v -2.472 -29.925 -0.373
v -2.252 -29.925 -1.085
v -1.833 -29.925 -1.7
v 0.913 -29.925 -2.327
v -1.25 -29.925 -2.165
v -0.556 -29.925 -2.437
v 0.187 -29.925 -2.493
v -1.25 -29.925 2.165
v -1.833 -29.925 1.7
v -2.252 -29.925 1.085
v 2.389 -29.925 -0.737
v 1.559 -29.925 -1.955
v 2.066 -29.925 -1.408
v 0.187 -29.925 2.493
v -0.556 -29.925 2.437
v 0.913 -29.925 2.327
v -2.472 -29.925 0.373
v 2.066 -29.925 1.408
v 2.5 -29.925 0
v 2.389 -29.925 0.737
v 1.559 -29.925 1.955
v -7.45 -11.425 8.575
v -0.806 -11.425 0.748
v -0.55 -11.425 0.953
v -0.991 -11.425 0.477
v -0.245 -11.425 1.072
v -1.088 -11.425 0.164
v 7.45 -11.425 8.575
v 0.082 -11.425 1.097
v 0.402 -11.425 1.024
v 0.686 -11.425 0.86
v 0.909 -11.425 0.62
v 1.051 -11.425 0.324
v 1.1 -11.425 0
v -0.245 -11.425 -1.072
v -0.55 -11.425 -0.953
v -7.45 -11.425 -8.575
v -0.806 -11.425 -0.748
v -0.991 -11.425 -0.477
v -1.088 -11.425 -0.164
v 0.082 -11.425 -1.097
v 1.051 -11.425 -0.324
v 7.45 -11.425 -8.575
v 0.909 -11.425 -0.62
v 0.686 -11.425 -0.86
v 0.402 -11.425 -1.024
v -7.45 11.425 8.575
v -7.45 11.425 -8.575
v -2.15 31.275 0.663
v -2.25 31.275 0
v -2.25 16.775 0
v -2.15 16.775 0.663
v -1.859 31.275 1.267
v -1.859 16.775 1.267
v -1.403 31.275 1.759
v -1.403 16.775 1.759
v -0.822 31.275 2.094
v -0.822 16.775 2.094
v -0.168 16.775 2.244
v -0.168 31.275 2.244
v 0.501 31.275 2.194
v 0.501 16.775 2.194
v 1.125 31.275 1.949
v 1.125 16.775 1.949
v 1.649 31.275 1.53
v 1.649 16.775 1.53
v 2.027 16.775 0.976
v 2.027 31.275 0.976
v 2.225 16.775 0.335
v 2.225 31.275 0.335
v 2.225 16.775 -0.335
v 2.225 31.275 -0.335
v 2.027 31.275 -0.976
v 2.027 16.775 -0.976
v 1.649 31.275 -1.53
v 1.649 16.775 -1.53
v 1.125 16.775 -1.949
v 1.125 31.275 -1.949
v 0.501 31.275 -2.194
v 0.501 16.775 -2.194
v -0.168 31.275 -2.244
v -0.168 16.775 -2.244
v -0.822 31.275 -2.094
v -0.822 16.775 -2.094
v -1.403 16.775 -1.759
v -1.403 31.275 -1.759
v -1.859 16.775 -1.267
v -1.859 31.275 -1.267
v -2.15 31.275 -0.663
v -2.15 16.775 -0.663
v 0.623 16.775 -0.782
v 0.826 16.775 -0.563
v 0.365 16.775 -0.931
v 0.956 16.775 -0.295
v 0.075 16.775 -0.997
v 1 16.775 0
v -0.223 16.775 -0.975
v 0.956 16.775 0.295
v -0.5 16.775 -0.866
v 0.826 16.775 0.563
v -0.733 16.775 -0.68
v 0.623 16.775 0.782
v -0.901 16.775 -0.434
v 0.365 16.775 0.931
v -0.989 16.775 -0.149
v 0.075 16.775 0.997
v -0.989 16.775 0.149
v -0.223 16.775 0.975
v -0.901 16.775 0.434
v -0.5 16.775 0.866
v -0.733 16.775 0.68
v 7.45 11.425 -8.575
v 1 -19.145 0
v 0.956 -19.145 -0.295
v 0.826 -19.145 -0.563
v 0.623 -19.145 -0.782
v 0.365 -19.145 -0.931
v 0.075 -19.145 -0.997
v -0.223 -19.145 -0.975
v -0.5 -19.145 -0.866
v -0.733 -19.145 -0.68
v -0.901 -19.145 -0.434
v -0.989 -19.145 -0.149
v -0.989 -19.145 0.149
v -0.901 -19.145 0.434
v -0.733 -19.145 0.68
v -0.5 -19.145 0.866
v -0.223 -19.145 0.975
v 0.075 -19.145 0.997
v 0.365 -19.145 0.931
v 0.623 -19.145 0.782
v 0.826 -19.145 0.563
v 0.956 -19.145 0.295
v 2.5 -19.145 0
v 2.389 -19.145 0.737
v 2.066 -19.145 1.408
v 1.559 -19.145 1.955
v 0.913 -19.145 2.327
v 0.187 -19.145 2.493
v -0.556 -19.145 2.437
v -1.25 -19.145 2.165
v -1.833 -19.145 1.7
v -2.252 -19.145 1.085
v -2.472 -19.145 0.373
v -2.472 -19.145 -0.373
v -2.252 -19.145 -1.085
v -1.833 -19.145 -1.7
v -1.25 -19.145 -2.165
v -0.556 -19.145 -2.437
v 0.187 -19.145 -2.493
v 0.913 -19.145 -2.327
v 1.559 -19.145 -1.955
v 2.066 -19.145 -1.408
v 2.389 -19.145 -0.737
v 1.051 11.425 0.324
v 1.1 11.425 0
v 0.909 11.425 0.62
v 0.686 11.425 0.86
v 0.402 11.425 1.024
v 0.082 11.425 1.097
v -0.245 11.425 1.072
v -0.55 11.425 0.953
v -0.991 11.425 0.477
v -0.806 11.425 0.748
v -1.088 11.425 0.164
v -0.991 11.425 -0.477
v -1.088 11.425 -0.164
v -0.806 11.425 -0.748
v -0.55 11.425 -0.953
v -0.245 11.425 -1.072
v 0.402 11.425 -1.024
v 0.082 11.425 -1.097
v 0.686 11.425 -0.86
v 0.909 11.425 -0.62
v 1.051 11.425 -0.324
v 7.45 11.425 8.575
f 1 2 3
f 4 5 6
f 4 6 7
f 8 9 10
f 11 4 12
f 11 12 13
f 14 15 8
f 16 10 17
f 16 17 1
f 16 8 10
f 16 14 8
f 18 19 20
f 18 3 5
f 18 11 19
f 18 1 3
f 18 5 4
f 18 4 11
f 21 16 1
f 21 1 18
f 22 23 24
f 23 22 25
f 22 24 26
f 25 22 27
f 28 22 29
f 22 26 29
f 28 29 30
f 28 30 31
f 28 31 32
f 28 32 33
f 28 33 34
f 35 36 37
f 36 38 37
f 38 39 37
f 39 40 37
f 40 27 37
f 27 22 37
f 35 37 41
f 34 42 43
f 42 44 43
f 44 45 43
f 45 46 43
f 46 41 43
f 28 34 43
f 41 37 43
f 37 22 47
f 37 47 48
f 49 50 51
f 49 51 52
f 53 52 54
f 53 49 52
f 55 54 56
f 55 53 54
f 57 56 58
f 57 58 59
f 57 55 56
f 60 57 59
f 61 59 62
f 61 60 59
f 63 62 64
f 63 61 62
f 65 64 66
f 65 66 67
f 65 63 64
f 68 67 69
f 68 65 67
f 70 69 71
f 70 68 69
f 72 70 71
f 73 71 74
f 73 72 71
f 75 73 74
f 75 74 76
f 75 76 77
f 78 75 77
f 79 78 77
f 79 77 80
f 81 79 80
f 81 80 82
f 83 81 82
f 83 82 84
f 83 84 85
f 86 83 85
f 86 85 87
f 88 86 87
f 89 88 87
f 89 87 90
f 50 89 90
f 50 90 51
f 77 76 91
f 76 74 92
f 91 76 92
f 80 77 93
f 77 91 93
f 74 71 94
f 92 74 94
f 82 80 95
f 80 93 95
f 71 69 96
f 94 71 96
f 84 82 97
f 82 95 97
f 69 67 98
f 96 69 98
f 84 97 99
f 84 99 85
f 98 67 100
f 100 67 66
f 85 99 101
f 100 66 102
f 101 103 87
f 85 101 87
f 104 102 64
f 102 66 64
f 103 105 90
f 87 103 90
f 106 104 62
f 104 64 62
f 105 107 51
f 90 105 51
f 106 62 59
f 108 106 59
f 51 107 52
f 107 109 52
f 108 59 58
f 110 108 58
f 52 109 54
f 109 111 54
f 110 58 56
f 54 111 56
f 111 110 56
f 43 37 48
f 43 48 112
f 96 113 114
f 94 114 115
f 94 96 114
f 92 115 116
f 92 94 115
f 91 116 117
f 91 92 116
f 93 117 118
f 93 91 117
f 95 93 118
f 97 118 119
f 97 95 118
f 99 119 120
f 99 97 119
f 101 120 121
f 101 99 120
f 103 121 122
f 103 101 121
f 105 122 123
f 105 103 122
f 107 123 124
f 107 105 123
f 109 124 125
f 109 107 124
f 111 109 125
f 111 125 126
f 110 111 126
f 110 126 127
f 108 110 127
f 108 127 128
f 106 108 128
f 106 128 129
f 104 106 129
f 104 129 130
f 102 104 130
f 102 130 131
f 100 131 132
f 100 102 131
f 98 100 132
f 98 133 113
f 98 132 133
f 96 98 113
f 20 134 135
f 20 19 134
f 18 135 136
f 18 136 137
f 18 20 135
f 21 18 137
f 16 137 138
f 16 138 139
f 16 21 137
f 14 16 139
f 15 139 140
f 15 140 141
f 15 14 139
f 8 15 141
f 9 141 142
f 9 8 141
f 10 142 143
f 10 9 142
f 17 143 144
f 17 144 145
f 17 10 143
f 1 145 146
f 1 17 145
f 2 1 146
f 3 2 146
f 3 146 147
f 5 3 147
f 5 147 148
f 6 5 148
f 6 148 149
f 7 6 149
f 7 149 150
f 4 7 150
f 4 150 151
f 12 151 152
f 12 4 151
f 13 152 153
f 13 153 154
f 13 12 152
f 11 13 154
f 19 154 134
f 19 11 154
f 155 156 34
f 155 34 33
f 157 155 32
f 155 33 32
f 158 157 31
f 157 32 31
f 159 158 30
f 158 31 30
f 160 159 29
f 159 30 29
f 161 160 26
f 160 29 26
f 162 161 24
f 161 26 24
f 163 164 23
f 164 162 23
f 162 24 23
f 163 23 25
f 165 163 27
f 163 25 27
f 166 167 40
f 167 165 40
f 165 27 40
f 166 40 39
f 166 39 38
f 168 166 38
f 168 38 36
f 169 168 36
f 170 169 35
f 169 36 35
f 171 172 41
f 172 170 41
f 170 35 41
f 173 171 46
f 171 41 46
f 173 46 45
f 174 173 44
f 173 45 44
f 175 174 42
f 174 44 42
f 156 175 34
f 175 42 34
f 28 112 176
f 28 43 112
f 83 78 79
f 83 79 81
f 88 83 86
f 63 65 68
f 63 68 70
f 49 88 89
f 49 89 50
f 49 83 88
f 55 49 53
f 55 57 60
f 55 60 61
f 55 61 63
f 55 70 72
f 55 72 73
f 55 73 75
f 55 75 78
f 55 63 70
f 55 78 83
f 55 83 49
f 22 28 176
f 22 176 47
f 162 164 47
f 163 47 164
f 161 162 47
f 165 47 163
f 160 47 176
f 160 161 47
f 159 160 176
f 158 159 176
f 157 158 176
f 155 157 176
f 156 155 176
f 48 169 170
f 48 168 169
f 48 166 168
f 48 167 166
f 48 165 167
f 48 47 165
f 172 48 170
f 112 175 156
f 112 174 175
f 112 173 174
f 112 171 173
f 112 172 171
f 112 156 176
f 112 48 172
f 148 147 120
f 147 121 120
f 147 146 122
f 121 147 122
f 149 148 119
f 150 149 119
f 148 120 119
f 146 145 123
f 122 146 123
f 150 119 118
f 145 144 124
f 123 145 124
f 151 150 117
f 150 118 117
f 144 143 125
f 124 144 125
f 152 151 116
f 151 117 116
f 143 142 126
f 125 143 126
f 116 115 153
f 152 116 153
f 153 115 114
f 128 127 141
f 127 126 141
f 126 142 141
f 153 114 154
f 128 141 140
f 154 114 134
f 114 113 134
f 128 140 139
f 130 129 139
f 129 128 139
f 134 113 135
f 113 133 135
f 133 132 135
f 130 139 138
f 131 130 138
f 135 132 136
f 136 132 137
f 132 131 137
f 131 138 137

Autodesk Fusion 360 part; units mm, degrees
sketch "Sketch1" plane through (0, 0, 0) normal (0, 1, 0) x (1, 0, 0)
  line L0 (7.45, -8.575) -> (-7.45, -8.575)
  line L1 (-7.45, -8.575) -> (-7.45, 8.575)
  line L2 (-7.45, 8.575) -> (7.45, 8.575)
  line L3 (7.45, 8.575) -> (7.45, -8.575)
  line L4 (7.45, -8.575) -> (-7.45, 8.575) construction
  line L5 (-7.45, -8.575) -> (7.45, 8.575) construction
  circle A0 centre (0, 0) radius 1
  circle A1 centre (0, 0) radius 1.1
  dimension "d1" = 14.9
  dimension "d2" = 17.15
  dimension "d5" = 2.2
  dimension "d6" = 2
extrude "Extrude1" add sketch "Sketch1" along normal mid plane 22.85 contours L0 L1 L2 L3 makes body 1
extrude "Extrude2" add sketch "Sketch1" along normal blind 42.7 and the other way blind 18.5 from surface at -11.425 separate body contours A0 makes body 2
sketch "Sketch2" plane through (0, -29.925, 0) normal (0, -1, 0) x (1, 0, 0)
  circle A0 centre (0, 0) radius 1
  circle A1 centre (0, 0) radius 2.5
  dimension "d11" = 5
extrude "Extrude3" add sketch "Sketch2" against normal blind 10.78 bodies 1 2
sketch "Sketch3" plane through (0, 31.275, 0) normal (0, 1, 0) x (-1, 0, 0)
  circle A0 centre (0, 0) radius 1
  circle A1 centre (0, 0) radius 2.25
  dimension "d15" = 4.5
extrude "Extrude4" add sketch "Sketch3" against normal blind 14.5 bodies 2
copy_body "Body->Comp1" bodies 1 removing the originals makes body 3 in component "Body"
copy_body "Body->Comp2" bodies 2 removing the originals makes body 4 in component "Rod"
component "Body" placed x (1, 0, 0) y (0, 1, 0) z (0, 0, 1) at (0, 0, 0)
component "Rod" placed x (1, 0, 0) y (0, 1, 0) z (0, 0, 1) at (0, 0, 0)
equation "d5 = d6 + 0.2 mm"
